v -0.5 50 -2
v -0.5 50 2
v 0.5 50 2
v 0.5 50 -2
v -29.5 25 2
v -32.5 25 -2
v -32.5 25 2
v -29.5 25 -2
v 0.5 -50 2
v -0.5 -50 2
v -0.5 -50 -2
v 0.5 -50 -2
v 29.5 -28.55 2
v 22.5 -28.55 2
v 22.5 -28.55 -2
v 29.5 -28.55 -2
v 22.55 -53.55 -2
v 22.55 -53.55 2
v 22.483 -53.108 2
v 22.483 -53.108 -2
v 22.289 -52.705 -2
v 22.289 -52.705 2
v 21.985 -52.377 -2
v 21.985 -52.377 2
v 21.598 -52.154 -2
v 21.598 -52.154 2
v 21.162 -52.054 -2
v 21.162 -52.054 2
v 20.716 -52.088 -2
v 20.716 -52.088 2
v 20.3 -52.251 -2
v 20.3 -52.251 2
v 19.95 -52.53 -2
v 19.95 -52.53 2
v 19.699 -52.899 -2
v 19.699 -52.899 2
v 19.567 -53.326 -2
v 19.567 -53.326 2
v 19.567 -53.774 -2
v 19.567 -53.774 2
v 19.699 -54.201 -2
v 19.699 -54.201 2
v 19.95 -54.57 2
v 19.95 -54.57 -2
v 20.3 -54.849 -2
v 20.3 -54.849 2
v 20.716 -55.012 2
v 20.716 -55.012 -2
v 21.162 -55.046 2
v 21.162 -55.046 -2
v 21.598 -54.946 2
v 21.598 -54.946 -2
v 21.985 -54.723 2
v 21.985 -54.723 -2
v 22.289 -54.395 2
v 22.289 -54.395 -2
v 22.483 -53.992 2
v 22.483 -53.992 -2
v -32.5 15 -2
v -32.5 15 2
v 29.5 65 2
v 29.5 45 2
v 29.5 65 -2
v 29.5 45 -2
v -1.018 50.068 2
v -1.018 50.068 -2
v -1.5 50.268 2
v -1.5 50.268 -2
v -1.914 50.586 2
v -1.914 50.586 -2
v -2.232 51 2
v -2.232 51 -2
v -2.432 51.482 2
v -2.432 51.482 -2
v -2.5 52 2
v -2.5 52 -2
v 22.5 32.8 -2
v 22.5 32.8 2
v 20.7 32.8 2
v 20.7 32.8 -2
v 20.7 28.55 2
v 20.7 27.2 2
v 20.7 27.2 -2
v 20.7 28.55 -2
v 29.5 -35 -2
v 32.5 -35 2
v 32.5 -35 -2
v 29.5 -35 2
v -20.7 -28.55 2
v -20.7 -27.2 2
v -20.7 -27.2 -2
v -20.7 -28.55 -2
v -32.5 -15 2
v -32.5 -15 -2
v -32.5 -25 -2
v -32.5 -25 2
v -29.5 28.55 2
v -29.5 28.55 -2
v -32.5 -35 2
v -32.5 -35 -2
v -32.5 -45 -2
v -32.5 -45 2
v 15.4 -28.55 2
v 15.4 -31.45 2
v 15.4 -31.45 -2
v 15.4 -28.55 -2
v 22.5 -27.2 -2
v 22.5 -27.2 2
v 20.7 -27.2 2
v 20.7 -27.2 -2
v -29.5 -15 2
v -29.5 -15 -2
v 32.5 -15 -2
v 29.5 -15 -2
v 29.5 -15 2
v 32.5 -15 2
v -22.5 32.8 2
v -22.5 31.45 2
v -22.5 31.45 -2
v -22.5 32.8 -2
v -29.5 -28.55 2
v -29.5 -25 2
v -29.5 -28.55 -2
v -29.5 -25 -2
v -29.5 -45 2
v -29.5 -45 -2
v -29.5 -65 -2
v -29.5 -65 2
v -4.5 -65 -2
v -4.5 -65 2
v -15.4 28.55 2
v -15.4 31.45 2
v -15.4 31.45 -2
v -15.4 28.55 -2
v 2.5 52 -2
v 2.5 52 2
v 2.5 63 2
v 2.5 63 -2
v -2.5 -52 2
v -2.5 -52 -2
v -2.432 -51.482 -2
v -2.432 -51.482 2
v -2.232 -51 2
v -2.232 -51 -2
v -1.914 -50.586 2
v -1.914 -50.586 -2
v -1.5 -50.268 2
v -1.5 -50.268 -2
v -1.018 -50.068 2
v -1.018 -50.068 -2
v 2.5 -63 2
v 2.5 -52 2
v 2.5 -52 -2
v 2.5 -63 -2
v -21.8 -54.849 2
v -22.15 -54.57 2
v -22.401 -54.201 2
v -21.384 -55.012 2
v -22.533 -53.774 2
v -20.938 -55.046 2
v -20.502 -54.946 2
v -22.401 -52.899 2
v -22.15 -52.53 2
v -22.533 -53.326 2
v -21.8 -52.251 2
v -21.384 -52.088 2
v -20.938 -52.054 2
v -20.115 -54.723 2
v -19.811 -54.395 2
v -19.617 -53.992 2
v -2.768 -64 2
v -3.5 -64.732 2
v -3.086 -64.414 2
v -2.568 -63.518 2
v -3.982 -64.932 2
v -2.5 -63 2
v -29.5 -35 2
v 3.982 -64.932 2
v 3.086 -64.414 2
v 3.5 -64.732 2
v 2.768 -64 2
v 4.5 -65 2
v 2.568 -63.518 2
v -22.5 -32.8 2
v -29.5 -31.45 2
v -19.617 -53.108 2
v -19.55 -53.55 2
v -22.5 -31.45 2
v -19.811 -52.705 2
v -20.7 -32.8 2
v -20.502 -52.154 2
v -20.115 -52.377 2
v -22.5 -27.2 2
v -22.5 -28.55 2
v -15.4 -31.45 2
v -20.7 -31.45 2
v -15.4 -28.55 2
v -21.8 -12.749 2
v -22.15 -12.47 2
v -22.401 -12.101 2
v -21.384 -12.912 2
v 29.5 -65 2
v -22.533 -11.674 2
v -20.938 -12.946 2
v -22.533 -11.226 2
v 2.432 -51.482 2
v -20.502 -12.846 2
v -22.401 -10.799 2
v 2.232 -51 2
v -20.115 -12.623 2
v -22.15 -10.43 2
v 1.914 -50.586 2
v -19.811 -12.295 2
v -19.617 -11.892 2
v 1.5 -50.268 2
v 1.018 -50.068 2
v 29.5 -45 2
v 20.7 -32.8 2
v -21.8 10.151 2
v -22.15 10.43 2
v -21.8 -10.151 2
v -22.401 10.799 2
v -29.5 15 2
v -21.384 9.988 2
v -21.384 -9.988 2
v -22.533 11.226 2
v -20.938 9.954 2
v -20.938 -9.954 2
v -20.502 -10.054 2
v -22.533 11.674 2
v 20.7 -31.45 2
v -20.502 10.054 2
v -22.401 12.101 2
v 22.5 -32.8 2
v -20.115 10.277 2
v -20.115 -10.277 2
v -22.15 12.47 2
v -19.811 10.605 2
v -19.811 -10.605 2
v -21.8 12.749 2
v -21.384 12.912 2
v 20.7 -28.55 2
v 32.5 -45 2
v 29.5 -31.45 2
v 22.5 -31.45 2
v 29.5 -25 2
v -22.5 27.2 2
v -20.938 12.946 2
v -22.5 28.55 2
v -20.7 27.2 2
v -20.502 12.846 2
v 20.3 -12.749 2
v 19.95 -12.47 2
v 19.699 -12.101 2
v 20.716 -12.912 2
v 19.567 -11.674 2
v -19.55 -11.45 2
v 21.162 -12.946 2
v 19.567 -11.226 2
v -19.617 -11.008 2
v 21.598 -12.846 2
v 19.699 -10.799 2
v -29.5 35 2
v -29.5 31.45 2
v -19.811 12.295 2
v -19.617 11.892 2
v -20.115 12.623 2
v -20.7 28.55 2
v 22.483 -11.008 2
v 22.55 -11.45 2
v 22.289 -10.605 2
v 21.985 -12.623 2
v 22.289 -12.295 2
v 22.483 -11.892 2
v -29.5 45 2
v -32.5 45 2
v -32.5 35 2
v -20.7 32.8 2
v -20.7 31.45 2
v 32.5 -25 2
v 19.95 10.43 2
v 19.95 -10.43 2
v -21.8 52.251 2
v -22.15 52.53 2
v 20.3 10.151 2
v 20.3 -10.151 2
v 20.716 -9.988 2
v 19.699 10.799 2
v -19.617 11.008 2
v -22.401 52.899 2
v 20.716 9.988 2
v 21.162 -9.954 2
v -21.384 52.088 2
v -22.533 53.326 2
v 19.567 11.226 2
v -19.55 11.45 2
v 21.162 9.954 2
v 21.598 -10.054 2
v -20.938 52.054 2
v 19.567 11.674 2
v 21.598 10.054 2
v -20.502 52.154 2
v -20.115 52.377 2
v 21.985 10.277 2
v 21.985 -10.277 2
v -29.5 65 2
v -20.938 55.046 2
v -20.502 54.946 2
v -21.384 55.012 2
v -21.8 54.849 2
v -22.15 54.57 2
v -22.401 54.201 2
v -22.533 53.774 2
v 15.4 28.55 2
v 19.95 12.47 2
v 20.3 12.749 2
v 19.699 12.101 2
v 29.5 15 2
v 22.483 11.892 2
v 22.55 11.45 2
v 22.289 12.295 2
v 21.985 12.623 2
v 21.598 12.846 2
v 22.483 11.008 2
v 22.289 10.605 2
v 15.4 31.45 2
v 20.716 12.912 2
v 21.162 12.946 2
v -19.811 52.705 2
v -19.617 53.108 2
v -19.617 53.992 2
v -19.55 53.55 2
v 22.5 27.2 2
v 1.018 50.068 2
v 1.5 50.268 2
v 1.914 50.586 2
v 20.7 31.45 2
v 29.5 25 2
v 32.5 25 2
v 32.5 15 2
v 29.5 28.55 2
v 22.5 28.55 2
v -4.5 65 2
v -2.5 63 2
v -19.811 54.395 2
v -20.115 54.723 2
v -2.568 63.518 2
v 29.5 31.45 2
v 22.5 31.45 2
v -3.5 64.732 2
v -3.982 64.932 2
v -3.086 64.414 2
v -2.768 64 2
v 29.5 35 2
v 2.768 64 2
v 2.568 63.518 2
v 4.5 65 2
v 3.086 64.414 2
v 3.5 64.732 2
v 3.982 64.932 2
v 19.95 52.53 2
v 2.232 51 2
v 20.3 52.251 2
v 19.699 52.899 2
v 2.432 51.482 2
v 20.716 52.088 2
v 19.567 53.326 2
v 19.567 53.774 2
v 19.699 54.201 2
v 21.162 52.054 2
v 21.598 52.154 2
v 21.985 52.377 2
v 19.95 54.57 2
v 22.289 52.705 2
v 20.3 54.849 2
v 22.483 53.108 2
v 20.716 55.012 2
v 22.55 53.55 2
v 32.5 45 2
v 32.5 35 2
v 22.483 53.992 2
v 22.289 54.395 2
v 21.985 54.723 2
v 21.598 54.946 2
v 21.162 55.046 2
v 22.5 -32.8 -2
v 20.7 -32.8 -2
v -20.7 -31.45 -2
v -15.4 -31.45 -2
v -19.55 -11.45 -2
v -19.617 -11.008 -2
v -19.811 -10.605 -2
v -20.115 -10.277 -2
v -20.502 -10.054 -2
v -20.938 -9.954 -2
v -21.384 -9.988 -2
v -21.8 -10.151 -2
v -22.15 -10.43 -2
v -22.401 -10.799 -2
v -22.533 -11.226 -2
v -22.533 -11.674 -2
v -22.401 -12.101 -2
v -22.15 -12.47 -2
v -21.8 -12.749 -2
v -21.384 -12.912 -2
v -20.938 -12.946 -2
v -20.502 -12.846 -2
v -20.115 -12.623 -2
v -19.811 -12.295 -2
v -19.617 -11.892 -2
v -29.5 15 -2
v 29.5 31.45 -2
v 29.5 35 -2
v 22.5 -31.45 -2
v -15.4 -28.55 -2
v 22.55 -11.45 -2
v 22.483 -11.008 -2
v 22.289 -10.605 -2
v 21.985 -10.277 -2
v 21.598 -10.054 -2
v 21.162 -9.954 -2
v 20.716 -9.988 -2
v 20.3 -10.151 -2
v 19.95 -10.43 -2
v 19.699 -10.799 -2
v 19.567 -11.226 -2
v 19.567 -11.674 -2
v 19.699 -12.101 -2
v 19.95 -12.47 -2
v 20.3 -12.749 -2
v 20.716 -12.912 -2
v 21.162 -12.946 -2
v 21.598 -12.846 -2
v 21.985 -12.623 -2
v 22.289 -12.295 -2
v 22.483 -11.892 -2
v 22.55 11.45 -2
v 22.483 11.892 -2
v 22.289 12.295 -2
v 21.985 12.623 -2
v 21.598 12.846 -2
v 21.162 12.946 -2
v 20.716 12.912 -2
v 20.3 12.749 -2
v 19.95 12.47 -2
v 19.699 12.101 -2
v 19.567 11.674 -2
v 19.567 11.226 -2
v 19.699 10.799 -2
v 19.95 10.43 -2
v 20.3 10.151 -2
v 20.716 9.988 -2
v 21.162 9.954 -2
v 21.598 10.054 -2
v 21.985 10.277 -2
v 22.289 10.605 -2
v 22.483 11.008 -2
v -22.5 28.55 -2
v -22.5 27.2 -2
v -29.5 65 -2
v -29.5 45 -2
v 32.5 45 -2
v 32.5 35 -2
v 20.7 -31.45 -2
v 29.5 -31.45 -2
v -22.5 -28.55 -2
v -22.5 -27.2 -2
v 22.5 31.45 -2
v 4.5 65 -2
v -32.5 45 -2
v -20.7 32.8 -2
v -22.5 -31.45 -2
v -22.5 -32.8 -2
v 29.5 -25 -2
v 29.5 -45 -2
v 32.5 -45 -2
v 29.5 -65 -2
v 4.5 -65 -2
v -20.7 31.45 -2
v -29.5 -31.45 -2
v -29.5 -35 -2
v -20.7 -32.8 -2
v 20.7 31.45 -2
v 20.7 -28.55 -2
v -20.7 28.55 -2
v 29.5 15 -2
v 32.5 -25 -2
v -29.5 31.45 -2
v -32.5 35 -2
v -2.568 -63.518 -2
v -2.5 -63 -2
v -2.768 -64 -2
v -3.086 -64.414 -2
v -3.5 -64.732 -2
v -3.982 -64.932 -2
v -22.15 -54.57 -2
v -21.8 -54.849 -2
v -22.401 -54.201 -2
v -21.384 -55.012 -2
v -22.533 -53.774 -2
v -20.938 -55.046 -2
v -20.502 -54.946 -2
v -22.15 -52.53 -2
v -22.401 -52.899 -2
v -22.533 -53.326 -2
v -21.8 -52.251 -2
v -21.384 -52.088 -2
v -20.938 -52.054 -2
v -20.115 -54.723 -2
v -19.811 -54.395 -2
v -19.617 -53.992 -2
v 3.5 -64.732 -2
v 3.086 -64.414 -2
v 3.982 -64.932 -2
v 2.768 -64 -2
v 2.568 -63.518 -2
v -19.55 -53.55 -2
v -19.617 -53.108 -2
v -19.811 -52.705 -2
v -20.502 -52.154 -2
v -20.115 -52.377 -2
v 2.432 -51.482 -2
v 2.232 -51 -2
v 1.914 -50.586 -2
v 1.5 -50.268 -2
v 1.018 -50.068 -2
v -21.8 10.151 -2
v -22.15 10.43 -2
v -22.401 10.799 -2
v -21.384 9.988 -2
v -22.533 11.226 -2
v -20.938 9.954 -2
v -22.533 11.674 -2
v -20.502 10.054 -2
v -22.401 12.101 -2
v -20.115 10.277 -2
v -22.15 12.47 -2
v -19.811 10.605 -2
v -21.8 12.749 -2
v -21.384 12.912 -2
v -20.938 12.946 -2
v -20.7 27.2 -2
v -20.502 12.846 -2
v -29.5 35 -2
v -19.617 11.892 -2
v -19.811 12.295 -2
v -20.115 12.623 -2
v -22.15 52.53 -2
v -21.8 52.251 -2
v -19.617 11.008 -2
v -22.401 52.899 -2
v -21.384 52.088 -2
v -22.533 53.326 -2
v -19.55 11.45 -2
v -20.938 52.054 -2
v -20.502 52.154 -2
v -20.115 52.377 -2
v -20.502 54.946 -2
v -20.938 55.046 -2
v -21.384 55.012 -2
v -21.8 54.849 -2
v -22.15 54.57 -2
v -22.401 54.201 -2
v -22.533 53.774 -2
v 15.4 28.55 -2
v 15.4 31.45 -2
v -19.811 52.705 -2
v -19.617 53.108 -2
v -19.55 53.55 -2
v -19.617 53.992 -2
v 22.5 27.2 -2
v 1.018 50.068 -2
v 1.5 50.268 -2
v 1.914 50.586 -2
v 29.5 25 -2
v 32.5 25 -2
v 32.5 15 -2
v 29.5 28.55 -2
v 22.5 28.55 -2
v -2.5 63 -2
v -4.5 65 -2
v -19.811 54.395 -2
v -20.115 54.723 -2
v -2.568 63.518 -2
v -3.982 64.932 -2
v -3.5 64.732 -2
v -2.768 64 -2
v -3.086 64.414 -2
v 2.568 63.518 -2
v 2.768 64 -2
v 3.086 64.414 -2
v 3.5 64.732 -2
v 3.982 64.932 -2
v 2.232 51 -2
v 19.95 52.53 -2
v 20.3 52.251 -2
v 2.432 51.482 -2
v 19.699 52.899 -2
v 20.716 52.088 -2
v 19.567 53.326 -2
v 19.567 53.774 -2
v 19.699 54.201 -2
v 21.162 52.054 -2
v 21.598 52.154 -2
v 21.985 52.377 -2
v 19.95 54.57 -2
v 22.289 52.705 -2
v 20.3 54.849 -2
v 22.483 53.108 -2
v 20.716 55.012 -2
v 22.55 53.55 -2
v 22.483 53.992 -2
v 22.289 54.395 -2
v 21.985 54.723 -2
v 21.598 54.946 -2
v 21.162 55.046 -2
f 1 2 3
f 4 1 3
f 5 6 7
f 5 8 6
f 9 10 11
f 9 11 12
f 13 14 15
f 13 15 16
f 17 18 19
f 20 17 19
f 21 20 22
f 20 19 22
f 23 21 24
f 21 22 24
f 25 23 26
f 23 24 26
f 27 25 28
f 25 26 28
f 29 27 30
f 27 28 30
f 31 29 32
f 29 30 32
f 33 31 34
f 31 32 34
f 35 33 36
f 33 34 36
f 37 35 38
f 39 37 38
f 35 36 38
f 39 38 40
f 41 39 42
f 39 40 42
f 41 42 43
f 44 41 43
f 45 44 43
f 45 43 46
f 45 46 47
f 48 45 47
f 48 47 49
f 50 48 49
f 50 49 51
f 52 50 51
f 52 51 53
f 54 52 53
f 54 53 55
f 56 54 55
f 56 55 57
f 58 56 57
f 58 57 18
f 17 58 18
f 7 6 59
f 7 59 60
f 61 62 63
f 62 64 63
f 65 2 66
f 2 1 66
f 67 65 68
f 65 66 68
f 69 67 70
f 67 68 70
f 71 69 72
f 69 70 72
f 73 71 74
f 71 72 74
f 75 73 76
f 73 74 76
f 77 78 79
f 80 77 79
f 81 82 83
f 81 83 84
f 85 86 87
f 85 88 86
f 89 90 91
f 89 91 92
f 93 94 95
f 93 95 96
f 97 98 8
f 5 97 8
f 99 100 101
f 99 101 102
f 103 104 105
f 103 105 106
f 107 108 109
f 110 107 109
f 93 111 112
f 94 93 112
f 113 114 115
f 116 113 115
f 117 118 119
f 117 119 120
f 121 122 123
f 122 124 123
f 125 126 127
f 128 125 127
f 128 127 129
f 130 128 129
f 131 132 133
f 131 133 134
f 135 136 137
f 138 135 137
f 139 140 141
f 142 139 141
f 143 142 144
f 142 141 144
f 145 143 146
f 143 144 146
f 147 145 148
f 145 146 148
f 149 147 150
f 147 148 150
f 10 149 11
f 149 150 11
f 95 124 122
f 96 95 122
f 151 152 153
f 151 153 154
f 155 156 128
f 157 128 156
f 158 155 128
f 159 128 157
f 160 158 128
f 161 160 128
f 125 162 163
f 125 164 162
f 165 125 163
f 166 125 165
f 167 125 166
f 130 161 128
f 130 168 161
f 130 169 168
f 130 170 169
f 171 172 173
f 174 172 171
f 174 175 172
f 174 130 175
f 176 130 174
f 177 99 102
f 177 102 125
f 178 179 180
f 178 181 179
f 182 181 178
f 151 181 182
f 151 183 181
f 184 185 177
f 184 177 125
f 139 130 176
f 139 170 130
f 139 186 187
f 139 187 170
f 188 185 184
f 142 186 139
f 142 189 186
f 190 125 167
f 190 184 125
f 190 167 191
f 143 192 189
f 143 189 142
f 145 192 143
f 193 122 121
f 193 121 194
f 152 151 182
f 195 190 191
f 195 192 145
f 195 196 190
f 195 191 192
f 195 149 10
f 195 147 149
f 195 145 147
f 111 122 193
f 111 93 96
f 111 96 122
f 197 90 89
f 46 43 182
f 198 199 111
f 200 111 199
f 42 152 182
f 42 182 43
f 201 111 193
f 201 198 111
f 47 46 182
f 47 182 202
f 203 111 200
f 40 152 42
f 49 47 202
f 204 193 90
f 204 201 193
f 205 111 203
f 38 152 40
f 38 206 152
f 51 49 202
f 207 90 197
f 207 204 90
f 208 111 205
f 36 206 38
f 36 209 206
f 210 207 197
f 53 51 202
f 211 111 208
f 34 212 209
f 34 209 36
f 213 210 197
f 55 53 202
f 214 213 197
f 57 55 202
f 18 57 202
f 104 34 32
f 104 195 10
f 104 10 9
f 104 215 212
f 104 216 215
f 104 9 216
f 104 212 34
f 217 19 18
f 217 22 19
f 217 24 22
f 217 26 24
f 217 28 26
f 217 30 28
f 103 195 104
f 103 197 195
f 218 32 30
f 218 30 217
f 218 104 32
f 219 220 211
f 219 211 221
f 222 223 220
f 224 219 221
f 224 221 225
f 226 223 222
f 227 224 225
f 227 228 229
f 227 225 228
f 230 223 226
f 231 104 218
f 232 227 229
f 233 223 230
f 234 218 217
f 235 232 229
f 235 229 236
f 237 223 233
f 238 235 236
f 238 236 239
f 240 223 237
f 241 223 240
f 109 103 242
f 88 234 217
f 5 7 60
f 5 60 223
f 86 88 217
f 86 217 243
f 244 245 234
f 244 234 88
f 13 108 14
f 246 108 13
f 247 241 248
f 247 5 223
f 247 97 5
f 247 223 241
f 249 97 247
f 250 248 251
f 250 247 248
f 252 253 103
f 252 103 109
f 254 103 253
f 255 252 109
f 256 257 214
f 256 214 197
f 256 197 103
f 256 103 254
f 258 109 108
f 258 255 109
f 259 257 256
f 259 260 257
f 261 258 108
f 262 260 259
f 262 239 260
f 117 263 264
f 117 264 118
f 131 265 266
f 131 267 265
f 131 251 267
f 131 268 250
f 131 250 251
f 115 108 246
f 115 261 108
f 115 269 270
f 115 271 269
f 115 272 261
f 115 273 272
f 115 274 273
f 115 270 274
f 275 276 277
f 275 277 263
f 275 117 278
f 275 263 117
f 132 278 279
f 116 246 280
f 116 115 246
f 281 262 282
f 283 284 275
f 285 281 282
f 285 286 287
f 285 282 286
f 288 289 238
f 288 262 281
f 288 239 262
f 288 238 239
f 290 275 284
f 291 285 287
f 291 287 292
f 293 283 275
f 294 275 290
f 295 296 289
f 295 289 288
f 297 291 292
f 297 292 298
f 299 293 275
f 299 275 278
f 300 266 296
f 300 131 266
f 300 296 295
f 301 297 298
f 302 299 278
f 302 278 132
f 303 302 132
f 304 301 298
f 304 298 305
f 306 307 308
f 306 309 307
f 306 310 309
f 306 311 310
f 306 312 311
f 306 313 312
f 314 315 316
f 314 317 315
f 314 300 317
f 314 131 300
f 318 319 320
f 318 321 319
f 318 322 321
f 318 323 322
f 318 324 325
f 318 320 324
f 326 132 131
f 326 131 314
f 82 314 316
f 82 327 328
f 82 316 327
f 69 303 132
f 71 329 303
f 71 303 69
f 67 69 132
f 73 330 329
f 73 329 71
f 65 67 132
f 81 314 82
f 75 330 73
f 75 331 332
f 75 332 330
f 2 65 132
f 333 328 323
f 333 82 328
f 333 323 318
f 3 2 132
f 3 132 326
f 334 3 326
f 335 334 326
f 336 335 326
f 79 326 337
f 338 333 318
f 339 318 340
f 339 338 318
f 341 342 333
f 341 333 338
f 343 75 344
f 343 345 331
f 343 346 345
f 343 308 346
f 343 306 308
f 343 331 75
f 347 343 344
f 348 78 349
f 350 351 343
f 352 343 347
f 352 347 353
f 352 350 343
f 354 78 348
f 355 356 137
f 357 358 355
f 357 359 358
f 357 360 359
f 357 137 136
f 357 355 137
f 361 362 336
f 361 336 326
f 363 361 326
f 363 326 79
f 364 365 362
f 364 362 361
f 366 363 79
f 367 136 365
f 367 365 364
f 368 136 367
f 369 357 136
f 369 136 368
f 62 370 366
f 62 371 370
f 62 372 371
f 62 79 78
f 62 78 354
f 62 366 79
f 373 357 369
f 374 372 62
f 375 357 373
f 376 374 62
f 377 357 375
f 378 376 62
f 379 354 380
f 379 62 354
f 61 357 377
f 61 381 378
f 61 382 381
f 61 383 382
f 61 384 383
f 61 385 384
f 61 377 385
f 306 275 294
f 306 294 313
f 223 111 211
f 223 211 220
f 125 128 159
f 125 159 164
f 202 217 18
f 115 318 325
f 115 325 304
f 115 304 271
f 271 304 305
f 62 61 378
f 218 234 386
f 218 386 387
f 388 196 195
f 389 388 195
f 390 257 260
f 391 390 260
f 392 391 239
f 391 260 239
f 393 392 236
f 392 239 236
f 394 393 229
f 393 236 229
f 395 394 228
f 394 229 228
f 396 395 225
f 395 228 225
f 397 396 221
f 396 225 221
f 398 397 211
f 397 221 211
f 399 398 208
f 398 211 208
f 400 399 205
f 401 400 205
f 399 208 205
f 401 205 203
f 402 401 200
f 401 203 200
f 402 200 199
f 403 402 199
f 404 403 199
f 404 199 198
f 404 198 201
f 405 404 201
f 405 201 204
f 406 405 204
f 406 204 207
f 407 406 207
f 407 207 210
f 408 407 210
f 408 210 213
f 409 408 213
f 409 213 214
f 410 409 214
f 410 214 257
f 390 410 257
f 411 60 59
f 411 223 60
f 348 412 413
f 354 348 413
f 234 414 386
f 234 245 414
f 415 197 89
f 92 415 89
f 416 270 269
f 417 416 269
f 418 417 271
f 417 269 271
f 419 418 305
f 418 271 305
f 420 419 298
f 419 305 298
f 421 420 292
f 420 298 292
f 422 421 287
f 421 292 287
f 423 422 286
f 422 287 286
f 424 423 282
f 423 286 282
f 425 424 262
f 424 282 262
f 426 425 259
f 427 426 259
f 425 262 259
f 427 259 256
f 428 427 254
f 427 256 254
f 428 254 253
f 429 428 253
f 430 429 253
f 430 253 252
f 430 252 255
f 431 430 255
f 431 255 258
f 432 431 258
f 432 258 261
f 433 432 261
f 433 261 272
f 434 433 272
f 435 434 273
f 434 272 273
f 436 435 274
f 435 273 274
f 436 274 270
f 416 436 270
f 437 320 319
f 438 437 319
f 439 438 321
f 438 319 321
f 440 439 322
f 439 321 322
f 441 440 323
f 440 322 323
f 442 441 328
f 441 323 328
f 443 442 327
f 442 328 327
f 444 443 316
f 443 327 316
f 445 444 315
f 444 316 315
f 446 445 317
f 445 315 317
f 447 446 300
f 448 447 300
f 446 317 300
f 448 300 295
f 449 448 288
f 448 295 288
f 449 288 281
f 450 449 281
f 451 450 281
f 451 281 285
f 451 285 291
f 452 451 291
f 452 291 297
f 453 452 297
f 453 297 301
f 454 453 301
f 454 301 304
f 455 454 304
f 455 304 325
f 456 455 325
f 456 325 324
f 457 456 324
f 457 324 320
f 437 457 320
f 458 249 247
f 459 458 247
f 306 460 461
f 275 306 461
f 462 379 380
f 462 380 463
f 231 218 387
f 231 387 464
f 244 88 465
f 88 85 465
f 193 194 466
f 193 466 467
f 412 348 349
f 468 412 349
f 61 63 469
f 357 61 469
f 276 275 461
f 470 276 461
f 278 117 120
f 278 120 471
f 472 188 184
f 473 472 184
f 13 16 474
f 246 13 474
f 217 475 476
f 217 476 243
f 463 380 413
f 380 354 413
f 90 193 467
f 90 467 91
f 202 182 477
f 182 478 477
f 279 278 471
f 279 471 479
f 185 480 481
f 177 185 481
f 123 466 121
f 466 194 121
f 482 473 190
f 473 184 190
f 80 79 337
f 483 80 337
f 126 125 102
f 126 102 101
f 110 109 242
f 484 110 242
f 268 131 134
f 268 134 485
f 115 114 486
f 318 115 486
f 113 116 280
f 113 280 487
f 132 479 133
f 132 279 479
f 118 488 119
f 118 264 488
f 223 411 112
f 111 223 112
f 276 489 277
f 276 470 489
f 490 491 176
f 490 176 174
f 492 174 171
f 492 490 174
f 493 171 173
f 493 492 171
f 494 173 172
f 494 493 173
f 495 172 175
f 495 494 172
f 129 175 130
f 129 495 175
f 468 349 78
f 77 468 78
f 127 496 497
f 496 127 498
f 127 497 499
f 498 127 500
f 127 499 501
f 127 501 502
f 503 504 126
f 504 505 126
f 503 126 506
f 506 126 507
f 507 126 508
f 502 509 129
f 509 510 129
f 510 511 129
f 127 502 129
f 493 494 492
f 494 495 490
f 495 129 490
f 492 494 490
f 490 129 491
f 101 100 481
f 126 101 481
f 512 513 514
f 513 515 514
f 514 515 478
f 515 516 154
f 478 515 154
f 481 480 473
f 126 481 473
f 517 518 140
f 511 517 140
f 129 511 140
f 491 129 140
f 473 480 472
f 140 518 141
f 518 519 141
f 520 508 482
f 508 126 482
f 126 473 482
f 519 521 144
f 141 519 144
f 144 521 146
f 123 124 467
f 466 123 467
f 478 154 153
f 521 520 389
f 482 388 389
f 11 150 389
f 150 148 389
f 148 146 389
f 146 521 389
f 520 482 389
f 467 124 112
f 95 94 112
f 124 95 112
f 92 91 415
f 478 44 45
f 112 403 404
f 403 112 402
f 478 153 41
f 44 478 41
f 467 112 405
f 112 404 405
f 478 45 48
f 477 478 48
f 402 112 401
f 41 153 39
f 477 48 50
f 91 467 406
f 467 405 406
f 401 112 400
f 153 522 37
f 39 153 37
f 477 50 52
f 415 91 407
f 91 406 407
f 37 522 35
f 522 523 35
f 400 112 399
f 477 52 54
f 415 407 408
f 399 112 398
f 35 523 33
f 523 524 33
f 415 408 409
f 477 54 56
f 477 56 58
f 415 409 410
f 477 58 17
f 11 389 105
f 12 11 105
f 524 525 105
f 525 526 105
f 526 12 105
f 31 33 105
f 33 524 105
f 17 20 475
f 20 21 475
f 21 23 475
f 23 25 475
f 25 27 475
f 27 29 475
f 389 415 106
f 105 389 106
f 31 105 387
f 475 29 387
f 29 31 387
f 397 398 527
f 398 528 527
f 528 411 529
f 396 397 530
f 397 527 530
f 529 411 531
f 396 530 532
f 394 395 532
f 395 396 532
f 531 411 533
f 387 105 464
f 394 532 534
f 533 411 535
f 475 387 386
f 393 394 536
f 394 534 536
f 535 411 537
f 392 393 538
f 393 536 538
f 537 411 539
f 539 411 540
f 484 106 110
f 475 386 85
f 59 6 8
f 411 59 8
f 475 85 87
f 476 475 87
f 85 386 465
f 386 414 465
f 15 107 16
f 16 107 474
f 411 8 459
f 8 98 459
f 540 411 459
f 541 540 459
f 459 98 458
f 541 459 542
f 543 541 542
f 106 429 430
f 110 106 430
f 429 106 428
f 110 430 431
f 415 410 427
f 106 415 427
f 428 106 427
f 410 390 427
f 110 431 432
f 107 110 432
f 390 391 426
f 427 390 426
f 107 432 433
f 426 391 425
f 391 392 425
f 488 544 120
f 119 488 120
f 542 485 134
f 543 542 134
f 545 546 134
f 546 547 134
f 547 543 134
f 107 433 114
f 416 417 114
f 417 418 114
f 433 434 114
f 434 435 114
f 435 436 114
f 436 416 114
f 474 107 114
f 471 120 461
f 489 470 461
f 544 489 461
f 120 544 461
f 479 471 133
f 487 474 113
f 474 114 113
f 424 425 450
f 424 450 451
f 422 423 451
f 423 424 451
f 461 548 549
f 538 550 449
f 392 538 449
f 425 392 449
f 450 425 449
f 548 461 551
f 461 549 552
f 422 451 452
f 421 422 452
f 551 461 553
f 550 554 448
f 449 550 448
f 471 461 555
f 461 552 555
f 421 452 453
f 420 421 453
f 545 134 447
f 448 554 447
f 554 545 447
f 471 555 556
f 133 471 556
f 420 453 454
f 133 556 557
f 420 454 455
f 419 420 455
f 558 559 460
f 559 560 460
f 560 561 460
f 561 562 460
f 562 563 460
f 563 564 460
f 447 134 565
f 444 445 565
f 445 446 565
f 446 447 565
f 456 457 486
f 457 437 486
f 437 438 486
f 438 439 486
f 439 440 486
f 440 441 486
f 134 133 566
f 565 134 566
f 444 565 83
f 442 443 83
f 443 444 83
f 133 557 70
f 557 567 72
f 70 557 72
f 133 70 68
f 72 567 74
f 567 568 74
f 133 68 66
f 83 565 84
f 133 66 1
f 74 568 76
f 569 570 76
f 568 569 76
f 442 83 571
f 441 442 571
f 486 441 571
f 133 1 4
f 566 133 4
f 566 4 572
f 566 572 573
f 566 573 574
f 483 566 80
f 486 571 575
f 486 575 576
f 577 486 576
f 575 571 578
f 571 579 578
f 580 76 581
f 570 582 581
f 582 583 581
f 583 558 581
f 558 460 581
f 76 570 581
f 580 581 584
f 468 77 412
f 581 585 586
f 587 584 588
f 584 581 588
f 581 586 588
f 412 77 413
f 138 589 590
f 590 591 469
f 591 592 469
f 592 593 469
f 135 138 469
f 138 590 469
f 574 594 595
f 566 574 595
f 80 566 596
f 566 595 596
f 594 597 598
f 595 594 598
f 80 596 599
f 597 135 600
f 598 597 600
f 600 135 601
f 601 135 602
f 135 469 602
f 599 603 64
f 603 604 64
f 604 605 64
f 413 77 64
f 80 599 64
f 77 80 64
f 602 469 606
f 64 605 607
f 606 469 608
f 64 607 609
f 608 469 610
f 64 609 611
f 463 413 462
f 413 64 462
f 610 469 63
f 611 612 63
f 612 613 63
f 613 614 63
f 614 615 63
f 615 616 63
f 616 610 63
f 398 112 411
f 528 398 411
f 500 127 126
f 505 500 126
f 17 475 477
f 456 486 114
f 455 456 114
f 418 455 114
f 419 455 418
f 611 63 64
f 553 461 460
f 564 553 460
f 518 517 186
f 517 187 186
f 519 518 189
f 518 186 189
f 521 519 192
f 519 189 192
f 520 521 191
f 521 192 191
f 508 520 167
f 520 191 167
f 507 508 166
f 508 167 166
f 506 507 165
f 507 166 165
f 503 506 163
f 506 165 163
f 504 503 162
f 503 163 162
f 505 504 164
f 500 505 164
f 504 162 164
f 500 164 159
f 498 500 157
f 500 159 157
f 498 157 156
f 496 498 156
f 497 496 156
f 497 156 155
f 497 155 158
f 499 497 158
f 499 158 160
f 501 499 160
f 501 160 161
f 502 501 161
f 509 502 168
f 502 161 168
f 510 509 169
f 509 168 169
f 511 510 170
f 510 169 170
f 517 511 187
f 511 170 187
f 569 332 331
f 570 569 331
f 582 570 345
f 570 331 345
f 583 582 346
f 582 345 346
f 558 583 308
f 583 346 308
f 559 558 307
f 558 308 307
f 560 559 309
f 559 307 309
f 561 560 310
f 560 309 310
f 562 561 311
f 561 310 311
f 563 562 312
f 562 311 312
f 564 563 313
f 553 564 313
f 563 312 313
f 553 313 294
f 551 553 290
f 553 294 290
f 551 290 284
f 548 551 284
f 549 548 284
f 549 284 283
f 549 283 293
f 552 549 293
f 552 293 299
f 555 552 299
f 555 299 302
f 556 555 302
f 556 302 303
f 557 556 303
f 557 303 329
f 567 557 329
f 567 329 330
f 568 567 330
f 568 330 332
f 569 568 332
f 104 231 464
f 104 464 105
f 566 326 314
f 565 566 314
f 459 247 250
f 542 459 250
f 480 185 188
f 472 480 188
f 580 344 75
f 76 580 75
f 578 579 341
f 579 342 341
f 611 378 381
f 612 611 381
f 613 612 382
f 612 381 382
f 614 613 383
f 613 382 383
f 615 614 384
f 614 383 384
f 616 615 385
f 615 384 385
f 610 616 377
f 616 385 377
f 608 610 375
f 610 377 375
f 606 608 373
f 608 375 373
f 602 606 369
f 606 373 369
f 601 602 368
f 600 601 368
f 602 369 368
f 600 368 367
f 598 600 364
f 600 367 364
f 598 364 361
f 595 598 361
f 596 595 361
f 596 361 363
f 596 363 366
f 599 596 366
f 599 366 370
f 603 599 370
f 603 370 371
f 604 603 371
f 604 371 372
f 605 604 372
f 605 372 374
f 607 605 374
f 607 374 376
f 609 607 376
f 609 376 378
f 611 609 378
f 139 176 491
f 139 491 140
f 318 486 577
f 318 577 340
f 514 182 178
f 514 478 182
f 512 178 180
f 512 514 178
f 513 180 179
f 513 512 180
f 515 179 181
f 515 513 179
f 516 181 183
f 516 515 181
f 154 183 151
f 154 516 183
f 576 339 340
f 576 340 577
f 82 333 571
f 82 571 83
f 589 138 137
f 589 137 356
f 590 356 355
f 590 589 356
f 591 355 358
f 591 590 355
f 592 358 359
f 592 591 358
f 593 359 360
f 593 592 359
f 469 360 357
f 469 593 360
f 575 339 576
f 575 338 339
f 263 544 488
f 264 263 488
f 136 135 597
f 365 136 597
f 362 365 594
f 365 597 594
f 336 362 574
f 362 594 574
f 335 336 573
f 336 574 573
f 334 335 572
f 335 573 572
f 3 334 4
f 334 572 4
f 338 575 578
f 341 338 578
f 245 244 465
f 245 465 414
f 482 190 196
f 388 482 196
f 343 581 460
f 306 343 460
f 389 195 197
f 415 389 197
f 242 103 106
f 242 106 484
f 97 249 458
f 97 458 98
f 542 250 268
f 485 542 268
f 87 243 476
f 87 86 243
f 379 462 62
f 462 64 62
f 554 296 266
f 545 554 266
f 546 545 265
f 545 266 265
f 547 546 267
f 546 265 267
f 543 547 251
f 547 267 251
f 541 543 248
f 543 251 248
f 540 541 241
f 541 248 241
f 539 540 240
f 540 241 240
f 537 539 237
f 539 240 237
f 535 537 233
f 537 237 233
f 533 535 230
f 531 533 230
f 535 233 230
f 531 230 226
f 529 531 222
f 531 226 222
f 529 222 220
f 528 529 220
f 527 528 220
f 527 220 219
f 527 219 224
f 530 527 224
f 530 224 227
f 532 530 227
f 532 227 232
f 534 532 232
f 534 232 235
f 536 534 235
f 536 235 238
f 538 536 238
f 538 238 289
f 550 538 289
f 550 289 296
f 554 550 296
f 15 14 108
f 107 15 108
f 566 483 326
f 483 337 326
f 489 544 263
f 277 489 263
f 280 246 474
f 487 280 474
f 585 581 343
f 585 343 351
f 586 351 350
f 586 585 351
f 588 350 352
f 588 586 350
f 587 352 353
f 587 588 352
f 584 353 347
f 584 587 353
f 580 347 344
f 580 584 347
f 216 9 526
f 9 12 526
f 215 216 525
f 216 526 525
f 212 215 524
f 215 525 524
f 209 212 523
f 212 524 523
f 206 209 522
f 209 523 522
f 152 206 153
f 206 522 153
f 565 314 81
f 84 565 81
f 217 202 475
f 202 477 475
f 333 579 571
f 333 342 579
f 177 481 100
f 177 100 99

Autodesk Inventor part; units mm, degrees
sketch "Эскиз1" plane through (0, 0, 0) normal (0, 0, 1) x (1, 0, 0)
  line L0 (-29.5, -65) -> (29.5, -65)
  line L1 (29.5, -65) -> (29.5, 65)
  line L2 (29.5, 65) -> (-29.5, 65)
  line L3 (-29.5, 65) -> (-29.5, -65)
  line L4 (-29.5, -65) -> (29.5, 65) construction
  line L5 (29.5, -65) -> (-29.5, 65) construction
  point P0 (0, 0)
  dimension "d0" = 59
  dimension "d1" = 130
extrude "Выдавливание1" add sketch "Эскиз1" along normal mid plane 4
sketch "Эскиз3" plane through (-29.5, -65, 2) normal (-1, 0, 0) x (0, 0, 1)
  line L0 (-4, 0) -> (-4, 130) projected
  line L1 (0, 0) -> (0, 130) projected
  line L2 (-4, 100) -> (0, 100)
  line L3 (0, 100) -> (0, 110)
  line L4 (0, 110) -> (-4, 110)
  line L5 (-4, 110) -> (-4, 100)
  line L6 (-4, 130) -> (0, 130) projected
  line L7 (-4, 90) -> (0, 90)
  line L8 (0, 90) -> (0, 80)
  line L9 (0, 80) -> (-4, 80)
  line L10 (-4, 80) -> (-4, 90)
  line L11 (-4, 65) -> (0, 65) construction
  line L12 (-4, 30) -> (0, 30)
  line L13 (0, 30) -> (0, 20)
  line L14 (0, 20) -> (-4, 20)
  line L15 (-4, 20) -> (-4, 30)
  line L16 (-4, 40) -> (0, 40)
  line L17 (0, 40) -> (0, 50)
  line L18 (0, 50) -> (-4, 50)
  line L19 (-4, 50) -> (-4, 40)
  point P0 (-2, 65)
  point P1 (0, 30)
  point P2 (0, 40)
  point P3 (0, 90)
  point P4 (0, 100)
  dimension "d18" = 10
  dimension "d19" = 10
  dimension "d20" = 20
  dimension "d21" = 10
extrude "Выдавливание3" add sketch "Эскиз3" along normal blind 3 contours L0 L12 L1 L14 | L0 L18 L1 L16 | L0 L7 L1 L9 | L0 L4 L1 L2
mirror "Зеркальное отражение2" about plane through (0, 0, 0) normal (1, 0, 0) of "Выдавливание3"
sketch "Эскиз4" plane through (0, 0, 2) normal (0, 0, 1) x (1, 0, 0)
  line L0 (-15.4, 31.45) -> (-15.4, 28.55)
  line L1 (-29.5, 28.55) -> (-29.5, 31.45)
  line L2 (-22.5, 32.8) -> (-20.7, 32.8)
  line L3 (-22.5, 27.2) -> (-20.7, 27.2)
  line L4 (-29.5, 30) -> (-15.4, 30)
  line L5 (-20.7, 27.2) -> (-20.7, 28.55)
  line L6 (-22.5, 31.45) -> (-22.5, 32.8)
  line L7 (-20.7, 32.8) -> (-20.7, 31.45)
  line L8 (-22.5, 28.55) -> (-22.5, 27.2)
  line L9 (-29.5, 31.45) -> (-22.5, 31.45)
  line L10 (-20.7, 31.45) -> (-15.4, 31.45)
  line L11 (-15.4, 28.55) -> (-20.7, 28.55)
  line L12 (-22.5, 28.55) -> (-29.5, 28.55)
  line L13 (-29.5, 35) -> (-29.5, 25) projected
  line L14 (0, 3.054) -> (0, -3.054) construction
  line L15 (-15.3649, 0) -> (15.3649, 0)
  line L16 (-15.4, -31.45) -> (-15.4, -28.55)
  line L17 (-29.5, -28.55) -> (-29.5, -31.45)
  line L18 (-22.5, -32.8) -> (-20.7, -32.8)
  line L19 (-22.5, -27.2) -> (-20.7, -27.2)
  line L20 (-29.5, -30) -> (-15.4, -30)
  line L21 (-20.7, -27.2) -> (-20.7, -28.55)
  line L22 (-22.5, -31.45) -> (-22.5, -32.8)
  line L23 (-20.7, -32.8) -> (-20.7, -31.45)
  line L24 (-22.5, -28.55) -> (-22.5, -27.2)
  line L25 (-29.5, -31.45) -> (-22.5, -31.45)
  line L26 (-20.7, -31.45) -> (-15.4, -31.45)
  line L27 (-15.4, -28.55) -> (-20.7, -28.55)
  line L28 (-22.5, -28.55) -> (-29.5, -28.55)
  line L29 (-29.5, -35) -> (-29.5, -25)
  line L30 (0, -3.054) -> (0, 3.054) construction
  line L31 (15.4, 31.45) -> (15.4, 28.55)
  line L32 (29.5, 28.55) -> (29.5, 31.45)
  line L33 (22.5, 32.8) -> (20.7, 32.8)
  line L34 (22.5, 27.2) -> (20.7, 27.2)
  line L35 (29.5, 30) -> (15.4, 30)
  line L36 (20.7, 27.2) -> (20.7, 28.55)
  line L37 (22.5, 31.45) -> (22.5, 32.8)
  line L38 (20.7, 32.8) -> (20.7, 31.45)
  line L39 (22.5, 28.55) -> (22.5, 27.2)
  line L40 (29.5, 31.45) -> (22.5, 31.45)
  line L41 (20.7, 31.45) -> (15.4, 31.45)
  line L42 (15.4, 28.55) -> (20.7, 28.55)
  line L43 (22.5, 28.55) -> (29.5, 28.55)
  line L44 (29.5, 35) -> (29.5, 25)
  line L45 (20.7, -27.2) -> (20.7, -28.55)
  line L46 (22.5, -27.2) -> (20.7, -27.2)
  line L47 (22.5, -28.55) -> (22.5, -27.2)
  line L48 (20.7, -31.45) -> (15.4, -31.45)
  line L49 (20.7, -32.8) -> (20.7, -31.45)
  line L50 (22.5, -32.8) -> (20.7, -32.8)
  line L51 (22.5, -31.45) -> (22.5, -32.8)
  line L52 (29.5, -30) -> (15.4, -30)
  line L53 (22.5, -28.55) -> (29.5, -28.55)
  line L54 (29.5, -28.55) -> (29.5, -31.45)
  line L55 (29.5, -31.45) -> (22.5, -31.45)
  line L56 (15.4, -31.45) -> (15.4, -28.55)
  line L57 (15.4, -28.55) -> (20.7, -28.55)
  point P0 (0, 0)
  point P1 (0, 0)
  point P2 (29.5, -25)
  dimension "d26" = 2.9
  dimension "d31" = 1.8
  dimension "d32" = 1.35
  dimension "d33" = 7
  dimension "d34" = 5.3
  dimension "d35" = 2.9
extrude "Выдавливание4" cut sketch "Эскиз4" against normal up to surface (4 mm away)
sketch "Эскиз5" plane through (0, 0, 2) normal (0, 0, 1) x (1, 0, 0)
  line L0 (29.5, 65) -> (-29.5, 65) construction
  line L1 (2.5, 65) -> (-2.5, 65)
  line L2 (-2.5, 65) -> (-2.5, 50)
  line L3 (-2.5, 50) -> (2.5, 50)
  line L4 (2.5, 50) -> (2.5, 65)
  line L5 (-2.9793, 0) -> (2.9793, 0) construction
  line L6 (29.5, -65) -> (-29.5, -65) construction
  line L7 (-2.5, -65) -> (-2.5, -50)
  line L8 (-2.5, -50) -> (2.5, -50)
  line L9 (2.5, -50) -> (2.5, -65)
  line L10 (-2.5, -65) -> (2.5, -65)
  line L11 (-29.5, -65) -> (29.5, -65) projected
  point P0 (0, 0)
  point P1 (0, 65)
  point P2 (0, 0)
  dimension "d38" = 5
  dimension "d39" = 15
extrude "Выдавливание5" cut sketch "Эскиз5" against normal up to surface (4 mm away)
fillet "Сопряжение1" radius 2 8 edges at (2.5, 50, 0) (-2.5, 50, 0) (-2.5, -50, 0) (2.5, -50, 0) (2.5, 65, 0) (-2.5, 65, 0) (2.5, -65, 0) (-2.5, -65, 0)
sketch "Эскиз8" plane through (0, 0, 2) normal (0, 0, 1) x (1, 0, 0)
  circle A0 centre (-21.05, 11.45) radius 1.5
  circle A1 centre (21.05, 11.45) radius 1.5
  circle A2 centre (-21.05, 53.55) radius 1.5
  circle A3 centre (21.05, 53.55) radius 1.5
  circle A4 centre (21.05, -11.45) radius 1.5
  circle A5 centre (-21.05, -11.45) radius 1.5
  circle A6 centre (-21.05, -53.55) radius 1.5
  circle A7 centre (21.05, -53.55) radius 1.5
  point P0 (0, 0)
extrude "Выдавливание8" cut sketch "Эскиз8" against normal up to surface (4 mm away)
properties part number "Фанерка ерпления колонок"
